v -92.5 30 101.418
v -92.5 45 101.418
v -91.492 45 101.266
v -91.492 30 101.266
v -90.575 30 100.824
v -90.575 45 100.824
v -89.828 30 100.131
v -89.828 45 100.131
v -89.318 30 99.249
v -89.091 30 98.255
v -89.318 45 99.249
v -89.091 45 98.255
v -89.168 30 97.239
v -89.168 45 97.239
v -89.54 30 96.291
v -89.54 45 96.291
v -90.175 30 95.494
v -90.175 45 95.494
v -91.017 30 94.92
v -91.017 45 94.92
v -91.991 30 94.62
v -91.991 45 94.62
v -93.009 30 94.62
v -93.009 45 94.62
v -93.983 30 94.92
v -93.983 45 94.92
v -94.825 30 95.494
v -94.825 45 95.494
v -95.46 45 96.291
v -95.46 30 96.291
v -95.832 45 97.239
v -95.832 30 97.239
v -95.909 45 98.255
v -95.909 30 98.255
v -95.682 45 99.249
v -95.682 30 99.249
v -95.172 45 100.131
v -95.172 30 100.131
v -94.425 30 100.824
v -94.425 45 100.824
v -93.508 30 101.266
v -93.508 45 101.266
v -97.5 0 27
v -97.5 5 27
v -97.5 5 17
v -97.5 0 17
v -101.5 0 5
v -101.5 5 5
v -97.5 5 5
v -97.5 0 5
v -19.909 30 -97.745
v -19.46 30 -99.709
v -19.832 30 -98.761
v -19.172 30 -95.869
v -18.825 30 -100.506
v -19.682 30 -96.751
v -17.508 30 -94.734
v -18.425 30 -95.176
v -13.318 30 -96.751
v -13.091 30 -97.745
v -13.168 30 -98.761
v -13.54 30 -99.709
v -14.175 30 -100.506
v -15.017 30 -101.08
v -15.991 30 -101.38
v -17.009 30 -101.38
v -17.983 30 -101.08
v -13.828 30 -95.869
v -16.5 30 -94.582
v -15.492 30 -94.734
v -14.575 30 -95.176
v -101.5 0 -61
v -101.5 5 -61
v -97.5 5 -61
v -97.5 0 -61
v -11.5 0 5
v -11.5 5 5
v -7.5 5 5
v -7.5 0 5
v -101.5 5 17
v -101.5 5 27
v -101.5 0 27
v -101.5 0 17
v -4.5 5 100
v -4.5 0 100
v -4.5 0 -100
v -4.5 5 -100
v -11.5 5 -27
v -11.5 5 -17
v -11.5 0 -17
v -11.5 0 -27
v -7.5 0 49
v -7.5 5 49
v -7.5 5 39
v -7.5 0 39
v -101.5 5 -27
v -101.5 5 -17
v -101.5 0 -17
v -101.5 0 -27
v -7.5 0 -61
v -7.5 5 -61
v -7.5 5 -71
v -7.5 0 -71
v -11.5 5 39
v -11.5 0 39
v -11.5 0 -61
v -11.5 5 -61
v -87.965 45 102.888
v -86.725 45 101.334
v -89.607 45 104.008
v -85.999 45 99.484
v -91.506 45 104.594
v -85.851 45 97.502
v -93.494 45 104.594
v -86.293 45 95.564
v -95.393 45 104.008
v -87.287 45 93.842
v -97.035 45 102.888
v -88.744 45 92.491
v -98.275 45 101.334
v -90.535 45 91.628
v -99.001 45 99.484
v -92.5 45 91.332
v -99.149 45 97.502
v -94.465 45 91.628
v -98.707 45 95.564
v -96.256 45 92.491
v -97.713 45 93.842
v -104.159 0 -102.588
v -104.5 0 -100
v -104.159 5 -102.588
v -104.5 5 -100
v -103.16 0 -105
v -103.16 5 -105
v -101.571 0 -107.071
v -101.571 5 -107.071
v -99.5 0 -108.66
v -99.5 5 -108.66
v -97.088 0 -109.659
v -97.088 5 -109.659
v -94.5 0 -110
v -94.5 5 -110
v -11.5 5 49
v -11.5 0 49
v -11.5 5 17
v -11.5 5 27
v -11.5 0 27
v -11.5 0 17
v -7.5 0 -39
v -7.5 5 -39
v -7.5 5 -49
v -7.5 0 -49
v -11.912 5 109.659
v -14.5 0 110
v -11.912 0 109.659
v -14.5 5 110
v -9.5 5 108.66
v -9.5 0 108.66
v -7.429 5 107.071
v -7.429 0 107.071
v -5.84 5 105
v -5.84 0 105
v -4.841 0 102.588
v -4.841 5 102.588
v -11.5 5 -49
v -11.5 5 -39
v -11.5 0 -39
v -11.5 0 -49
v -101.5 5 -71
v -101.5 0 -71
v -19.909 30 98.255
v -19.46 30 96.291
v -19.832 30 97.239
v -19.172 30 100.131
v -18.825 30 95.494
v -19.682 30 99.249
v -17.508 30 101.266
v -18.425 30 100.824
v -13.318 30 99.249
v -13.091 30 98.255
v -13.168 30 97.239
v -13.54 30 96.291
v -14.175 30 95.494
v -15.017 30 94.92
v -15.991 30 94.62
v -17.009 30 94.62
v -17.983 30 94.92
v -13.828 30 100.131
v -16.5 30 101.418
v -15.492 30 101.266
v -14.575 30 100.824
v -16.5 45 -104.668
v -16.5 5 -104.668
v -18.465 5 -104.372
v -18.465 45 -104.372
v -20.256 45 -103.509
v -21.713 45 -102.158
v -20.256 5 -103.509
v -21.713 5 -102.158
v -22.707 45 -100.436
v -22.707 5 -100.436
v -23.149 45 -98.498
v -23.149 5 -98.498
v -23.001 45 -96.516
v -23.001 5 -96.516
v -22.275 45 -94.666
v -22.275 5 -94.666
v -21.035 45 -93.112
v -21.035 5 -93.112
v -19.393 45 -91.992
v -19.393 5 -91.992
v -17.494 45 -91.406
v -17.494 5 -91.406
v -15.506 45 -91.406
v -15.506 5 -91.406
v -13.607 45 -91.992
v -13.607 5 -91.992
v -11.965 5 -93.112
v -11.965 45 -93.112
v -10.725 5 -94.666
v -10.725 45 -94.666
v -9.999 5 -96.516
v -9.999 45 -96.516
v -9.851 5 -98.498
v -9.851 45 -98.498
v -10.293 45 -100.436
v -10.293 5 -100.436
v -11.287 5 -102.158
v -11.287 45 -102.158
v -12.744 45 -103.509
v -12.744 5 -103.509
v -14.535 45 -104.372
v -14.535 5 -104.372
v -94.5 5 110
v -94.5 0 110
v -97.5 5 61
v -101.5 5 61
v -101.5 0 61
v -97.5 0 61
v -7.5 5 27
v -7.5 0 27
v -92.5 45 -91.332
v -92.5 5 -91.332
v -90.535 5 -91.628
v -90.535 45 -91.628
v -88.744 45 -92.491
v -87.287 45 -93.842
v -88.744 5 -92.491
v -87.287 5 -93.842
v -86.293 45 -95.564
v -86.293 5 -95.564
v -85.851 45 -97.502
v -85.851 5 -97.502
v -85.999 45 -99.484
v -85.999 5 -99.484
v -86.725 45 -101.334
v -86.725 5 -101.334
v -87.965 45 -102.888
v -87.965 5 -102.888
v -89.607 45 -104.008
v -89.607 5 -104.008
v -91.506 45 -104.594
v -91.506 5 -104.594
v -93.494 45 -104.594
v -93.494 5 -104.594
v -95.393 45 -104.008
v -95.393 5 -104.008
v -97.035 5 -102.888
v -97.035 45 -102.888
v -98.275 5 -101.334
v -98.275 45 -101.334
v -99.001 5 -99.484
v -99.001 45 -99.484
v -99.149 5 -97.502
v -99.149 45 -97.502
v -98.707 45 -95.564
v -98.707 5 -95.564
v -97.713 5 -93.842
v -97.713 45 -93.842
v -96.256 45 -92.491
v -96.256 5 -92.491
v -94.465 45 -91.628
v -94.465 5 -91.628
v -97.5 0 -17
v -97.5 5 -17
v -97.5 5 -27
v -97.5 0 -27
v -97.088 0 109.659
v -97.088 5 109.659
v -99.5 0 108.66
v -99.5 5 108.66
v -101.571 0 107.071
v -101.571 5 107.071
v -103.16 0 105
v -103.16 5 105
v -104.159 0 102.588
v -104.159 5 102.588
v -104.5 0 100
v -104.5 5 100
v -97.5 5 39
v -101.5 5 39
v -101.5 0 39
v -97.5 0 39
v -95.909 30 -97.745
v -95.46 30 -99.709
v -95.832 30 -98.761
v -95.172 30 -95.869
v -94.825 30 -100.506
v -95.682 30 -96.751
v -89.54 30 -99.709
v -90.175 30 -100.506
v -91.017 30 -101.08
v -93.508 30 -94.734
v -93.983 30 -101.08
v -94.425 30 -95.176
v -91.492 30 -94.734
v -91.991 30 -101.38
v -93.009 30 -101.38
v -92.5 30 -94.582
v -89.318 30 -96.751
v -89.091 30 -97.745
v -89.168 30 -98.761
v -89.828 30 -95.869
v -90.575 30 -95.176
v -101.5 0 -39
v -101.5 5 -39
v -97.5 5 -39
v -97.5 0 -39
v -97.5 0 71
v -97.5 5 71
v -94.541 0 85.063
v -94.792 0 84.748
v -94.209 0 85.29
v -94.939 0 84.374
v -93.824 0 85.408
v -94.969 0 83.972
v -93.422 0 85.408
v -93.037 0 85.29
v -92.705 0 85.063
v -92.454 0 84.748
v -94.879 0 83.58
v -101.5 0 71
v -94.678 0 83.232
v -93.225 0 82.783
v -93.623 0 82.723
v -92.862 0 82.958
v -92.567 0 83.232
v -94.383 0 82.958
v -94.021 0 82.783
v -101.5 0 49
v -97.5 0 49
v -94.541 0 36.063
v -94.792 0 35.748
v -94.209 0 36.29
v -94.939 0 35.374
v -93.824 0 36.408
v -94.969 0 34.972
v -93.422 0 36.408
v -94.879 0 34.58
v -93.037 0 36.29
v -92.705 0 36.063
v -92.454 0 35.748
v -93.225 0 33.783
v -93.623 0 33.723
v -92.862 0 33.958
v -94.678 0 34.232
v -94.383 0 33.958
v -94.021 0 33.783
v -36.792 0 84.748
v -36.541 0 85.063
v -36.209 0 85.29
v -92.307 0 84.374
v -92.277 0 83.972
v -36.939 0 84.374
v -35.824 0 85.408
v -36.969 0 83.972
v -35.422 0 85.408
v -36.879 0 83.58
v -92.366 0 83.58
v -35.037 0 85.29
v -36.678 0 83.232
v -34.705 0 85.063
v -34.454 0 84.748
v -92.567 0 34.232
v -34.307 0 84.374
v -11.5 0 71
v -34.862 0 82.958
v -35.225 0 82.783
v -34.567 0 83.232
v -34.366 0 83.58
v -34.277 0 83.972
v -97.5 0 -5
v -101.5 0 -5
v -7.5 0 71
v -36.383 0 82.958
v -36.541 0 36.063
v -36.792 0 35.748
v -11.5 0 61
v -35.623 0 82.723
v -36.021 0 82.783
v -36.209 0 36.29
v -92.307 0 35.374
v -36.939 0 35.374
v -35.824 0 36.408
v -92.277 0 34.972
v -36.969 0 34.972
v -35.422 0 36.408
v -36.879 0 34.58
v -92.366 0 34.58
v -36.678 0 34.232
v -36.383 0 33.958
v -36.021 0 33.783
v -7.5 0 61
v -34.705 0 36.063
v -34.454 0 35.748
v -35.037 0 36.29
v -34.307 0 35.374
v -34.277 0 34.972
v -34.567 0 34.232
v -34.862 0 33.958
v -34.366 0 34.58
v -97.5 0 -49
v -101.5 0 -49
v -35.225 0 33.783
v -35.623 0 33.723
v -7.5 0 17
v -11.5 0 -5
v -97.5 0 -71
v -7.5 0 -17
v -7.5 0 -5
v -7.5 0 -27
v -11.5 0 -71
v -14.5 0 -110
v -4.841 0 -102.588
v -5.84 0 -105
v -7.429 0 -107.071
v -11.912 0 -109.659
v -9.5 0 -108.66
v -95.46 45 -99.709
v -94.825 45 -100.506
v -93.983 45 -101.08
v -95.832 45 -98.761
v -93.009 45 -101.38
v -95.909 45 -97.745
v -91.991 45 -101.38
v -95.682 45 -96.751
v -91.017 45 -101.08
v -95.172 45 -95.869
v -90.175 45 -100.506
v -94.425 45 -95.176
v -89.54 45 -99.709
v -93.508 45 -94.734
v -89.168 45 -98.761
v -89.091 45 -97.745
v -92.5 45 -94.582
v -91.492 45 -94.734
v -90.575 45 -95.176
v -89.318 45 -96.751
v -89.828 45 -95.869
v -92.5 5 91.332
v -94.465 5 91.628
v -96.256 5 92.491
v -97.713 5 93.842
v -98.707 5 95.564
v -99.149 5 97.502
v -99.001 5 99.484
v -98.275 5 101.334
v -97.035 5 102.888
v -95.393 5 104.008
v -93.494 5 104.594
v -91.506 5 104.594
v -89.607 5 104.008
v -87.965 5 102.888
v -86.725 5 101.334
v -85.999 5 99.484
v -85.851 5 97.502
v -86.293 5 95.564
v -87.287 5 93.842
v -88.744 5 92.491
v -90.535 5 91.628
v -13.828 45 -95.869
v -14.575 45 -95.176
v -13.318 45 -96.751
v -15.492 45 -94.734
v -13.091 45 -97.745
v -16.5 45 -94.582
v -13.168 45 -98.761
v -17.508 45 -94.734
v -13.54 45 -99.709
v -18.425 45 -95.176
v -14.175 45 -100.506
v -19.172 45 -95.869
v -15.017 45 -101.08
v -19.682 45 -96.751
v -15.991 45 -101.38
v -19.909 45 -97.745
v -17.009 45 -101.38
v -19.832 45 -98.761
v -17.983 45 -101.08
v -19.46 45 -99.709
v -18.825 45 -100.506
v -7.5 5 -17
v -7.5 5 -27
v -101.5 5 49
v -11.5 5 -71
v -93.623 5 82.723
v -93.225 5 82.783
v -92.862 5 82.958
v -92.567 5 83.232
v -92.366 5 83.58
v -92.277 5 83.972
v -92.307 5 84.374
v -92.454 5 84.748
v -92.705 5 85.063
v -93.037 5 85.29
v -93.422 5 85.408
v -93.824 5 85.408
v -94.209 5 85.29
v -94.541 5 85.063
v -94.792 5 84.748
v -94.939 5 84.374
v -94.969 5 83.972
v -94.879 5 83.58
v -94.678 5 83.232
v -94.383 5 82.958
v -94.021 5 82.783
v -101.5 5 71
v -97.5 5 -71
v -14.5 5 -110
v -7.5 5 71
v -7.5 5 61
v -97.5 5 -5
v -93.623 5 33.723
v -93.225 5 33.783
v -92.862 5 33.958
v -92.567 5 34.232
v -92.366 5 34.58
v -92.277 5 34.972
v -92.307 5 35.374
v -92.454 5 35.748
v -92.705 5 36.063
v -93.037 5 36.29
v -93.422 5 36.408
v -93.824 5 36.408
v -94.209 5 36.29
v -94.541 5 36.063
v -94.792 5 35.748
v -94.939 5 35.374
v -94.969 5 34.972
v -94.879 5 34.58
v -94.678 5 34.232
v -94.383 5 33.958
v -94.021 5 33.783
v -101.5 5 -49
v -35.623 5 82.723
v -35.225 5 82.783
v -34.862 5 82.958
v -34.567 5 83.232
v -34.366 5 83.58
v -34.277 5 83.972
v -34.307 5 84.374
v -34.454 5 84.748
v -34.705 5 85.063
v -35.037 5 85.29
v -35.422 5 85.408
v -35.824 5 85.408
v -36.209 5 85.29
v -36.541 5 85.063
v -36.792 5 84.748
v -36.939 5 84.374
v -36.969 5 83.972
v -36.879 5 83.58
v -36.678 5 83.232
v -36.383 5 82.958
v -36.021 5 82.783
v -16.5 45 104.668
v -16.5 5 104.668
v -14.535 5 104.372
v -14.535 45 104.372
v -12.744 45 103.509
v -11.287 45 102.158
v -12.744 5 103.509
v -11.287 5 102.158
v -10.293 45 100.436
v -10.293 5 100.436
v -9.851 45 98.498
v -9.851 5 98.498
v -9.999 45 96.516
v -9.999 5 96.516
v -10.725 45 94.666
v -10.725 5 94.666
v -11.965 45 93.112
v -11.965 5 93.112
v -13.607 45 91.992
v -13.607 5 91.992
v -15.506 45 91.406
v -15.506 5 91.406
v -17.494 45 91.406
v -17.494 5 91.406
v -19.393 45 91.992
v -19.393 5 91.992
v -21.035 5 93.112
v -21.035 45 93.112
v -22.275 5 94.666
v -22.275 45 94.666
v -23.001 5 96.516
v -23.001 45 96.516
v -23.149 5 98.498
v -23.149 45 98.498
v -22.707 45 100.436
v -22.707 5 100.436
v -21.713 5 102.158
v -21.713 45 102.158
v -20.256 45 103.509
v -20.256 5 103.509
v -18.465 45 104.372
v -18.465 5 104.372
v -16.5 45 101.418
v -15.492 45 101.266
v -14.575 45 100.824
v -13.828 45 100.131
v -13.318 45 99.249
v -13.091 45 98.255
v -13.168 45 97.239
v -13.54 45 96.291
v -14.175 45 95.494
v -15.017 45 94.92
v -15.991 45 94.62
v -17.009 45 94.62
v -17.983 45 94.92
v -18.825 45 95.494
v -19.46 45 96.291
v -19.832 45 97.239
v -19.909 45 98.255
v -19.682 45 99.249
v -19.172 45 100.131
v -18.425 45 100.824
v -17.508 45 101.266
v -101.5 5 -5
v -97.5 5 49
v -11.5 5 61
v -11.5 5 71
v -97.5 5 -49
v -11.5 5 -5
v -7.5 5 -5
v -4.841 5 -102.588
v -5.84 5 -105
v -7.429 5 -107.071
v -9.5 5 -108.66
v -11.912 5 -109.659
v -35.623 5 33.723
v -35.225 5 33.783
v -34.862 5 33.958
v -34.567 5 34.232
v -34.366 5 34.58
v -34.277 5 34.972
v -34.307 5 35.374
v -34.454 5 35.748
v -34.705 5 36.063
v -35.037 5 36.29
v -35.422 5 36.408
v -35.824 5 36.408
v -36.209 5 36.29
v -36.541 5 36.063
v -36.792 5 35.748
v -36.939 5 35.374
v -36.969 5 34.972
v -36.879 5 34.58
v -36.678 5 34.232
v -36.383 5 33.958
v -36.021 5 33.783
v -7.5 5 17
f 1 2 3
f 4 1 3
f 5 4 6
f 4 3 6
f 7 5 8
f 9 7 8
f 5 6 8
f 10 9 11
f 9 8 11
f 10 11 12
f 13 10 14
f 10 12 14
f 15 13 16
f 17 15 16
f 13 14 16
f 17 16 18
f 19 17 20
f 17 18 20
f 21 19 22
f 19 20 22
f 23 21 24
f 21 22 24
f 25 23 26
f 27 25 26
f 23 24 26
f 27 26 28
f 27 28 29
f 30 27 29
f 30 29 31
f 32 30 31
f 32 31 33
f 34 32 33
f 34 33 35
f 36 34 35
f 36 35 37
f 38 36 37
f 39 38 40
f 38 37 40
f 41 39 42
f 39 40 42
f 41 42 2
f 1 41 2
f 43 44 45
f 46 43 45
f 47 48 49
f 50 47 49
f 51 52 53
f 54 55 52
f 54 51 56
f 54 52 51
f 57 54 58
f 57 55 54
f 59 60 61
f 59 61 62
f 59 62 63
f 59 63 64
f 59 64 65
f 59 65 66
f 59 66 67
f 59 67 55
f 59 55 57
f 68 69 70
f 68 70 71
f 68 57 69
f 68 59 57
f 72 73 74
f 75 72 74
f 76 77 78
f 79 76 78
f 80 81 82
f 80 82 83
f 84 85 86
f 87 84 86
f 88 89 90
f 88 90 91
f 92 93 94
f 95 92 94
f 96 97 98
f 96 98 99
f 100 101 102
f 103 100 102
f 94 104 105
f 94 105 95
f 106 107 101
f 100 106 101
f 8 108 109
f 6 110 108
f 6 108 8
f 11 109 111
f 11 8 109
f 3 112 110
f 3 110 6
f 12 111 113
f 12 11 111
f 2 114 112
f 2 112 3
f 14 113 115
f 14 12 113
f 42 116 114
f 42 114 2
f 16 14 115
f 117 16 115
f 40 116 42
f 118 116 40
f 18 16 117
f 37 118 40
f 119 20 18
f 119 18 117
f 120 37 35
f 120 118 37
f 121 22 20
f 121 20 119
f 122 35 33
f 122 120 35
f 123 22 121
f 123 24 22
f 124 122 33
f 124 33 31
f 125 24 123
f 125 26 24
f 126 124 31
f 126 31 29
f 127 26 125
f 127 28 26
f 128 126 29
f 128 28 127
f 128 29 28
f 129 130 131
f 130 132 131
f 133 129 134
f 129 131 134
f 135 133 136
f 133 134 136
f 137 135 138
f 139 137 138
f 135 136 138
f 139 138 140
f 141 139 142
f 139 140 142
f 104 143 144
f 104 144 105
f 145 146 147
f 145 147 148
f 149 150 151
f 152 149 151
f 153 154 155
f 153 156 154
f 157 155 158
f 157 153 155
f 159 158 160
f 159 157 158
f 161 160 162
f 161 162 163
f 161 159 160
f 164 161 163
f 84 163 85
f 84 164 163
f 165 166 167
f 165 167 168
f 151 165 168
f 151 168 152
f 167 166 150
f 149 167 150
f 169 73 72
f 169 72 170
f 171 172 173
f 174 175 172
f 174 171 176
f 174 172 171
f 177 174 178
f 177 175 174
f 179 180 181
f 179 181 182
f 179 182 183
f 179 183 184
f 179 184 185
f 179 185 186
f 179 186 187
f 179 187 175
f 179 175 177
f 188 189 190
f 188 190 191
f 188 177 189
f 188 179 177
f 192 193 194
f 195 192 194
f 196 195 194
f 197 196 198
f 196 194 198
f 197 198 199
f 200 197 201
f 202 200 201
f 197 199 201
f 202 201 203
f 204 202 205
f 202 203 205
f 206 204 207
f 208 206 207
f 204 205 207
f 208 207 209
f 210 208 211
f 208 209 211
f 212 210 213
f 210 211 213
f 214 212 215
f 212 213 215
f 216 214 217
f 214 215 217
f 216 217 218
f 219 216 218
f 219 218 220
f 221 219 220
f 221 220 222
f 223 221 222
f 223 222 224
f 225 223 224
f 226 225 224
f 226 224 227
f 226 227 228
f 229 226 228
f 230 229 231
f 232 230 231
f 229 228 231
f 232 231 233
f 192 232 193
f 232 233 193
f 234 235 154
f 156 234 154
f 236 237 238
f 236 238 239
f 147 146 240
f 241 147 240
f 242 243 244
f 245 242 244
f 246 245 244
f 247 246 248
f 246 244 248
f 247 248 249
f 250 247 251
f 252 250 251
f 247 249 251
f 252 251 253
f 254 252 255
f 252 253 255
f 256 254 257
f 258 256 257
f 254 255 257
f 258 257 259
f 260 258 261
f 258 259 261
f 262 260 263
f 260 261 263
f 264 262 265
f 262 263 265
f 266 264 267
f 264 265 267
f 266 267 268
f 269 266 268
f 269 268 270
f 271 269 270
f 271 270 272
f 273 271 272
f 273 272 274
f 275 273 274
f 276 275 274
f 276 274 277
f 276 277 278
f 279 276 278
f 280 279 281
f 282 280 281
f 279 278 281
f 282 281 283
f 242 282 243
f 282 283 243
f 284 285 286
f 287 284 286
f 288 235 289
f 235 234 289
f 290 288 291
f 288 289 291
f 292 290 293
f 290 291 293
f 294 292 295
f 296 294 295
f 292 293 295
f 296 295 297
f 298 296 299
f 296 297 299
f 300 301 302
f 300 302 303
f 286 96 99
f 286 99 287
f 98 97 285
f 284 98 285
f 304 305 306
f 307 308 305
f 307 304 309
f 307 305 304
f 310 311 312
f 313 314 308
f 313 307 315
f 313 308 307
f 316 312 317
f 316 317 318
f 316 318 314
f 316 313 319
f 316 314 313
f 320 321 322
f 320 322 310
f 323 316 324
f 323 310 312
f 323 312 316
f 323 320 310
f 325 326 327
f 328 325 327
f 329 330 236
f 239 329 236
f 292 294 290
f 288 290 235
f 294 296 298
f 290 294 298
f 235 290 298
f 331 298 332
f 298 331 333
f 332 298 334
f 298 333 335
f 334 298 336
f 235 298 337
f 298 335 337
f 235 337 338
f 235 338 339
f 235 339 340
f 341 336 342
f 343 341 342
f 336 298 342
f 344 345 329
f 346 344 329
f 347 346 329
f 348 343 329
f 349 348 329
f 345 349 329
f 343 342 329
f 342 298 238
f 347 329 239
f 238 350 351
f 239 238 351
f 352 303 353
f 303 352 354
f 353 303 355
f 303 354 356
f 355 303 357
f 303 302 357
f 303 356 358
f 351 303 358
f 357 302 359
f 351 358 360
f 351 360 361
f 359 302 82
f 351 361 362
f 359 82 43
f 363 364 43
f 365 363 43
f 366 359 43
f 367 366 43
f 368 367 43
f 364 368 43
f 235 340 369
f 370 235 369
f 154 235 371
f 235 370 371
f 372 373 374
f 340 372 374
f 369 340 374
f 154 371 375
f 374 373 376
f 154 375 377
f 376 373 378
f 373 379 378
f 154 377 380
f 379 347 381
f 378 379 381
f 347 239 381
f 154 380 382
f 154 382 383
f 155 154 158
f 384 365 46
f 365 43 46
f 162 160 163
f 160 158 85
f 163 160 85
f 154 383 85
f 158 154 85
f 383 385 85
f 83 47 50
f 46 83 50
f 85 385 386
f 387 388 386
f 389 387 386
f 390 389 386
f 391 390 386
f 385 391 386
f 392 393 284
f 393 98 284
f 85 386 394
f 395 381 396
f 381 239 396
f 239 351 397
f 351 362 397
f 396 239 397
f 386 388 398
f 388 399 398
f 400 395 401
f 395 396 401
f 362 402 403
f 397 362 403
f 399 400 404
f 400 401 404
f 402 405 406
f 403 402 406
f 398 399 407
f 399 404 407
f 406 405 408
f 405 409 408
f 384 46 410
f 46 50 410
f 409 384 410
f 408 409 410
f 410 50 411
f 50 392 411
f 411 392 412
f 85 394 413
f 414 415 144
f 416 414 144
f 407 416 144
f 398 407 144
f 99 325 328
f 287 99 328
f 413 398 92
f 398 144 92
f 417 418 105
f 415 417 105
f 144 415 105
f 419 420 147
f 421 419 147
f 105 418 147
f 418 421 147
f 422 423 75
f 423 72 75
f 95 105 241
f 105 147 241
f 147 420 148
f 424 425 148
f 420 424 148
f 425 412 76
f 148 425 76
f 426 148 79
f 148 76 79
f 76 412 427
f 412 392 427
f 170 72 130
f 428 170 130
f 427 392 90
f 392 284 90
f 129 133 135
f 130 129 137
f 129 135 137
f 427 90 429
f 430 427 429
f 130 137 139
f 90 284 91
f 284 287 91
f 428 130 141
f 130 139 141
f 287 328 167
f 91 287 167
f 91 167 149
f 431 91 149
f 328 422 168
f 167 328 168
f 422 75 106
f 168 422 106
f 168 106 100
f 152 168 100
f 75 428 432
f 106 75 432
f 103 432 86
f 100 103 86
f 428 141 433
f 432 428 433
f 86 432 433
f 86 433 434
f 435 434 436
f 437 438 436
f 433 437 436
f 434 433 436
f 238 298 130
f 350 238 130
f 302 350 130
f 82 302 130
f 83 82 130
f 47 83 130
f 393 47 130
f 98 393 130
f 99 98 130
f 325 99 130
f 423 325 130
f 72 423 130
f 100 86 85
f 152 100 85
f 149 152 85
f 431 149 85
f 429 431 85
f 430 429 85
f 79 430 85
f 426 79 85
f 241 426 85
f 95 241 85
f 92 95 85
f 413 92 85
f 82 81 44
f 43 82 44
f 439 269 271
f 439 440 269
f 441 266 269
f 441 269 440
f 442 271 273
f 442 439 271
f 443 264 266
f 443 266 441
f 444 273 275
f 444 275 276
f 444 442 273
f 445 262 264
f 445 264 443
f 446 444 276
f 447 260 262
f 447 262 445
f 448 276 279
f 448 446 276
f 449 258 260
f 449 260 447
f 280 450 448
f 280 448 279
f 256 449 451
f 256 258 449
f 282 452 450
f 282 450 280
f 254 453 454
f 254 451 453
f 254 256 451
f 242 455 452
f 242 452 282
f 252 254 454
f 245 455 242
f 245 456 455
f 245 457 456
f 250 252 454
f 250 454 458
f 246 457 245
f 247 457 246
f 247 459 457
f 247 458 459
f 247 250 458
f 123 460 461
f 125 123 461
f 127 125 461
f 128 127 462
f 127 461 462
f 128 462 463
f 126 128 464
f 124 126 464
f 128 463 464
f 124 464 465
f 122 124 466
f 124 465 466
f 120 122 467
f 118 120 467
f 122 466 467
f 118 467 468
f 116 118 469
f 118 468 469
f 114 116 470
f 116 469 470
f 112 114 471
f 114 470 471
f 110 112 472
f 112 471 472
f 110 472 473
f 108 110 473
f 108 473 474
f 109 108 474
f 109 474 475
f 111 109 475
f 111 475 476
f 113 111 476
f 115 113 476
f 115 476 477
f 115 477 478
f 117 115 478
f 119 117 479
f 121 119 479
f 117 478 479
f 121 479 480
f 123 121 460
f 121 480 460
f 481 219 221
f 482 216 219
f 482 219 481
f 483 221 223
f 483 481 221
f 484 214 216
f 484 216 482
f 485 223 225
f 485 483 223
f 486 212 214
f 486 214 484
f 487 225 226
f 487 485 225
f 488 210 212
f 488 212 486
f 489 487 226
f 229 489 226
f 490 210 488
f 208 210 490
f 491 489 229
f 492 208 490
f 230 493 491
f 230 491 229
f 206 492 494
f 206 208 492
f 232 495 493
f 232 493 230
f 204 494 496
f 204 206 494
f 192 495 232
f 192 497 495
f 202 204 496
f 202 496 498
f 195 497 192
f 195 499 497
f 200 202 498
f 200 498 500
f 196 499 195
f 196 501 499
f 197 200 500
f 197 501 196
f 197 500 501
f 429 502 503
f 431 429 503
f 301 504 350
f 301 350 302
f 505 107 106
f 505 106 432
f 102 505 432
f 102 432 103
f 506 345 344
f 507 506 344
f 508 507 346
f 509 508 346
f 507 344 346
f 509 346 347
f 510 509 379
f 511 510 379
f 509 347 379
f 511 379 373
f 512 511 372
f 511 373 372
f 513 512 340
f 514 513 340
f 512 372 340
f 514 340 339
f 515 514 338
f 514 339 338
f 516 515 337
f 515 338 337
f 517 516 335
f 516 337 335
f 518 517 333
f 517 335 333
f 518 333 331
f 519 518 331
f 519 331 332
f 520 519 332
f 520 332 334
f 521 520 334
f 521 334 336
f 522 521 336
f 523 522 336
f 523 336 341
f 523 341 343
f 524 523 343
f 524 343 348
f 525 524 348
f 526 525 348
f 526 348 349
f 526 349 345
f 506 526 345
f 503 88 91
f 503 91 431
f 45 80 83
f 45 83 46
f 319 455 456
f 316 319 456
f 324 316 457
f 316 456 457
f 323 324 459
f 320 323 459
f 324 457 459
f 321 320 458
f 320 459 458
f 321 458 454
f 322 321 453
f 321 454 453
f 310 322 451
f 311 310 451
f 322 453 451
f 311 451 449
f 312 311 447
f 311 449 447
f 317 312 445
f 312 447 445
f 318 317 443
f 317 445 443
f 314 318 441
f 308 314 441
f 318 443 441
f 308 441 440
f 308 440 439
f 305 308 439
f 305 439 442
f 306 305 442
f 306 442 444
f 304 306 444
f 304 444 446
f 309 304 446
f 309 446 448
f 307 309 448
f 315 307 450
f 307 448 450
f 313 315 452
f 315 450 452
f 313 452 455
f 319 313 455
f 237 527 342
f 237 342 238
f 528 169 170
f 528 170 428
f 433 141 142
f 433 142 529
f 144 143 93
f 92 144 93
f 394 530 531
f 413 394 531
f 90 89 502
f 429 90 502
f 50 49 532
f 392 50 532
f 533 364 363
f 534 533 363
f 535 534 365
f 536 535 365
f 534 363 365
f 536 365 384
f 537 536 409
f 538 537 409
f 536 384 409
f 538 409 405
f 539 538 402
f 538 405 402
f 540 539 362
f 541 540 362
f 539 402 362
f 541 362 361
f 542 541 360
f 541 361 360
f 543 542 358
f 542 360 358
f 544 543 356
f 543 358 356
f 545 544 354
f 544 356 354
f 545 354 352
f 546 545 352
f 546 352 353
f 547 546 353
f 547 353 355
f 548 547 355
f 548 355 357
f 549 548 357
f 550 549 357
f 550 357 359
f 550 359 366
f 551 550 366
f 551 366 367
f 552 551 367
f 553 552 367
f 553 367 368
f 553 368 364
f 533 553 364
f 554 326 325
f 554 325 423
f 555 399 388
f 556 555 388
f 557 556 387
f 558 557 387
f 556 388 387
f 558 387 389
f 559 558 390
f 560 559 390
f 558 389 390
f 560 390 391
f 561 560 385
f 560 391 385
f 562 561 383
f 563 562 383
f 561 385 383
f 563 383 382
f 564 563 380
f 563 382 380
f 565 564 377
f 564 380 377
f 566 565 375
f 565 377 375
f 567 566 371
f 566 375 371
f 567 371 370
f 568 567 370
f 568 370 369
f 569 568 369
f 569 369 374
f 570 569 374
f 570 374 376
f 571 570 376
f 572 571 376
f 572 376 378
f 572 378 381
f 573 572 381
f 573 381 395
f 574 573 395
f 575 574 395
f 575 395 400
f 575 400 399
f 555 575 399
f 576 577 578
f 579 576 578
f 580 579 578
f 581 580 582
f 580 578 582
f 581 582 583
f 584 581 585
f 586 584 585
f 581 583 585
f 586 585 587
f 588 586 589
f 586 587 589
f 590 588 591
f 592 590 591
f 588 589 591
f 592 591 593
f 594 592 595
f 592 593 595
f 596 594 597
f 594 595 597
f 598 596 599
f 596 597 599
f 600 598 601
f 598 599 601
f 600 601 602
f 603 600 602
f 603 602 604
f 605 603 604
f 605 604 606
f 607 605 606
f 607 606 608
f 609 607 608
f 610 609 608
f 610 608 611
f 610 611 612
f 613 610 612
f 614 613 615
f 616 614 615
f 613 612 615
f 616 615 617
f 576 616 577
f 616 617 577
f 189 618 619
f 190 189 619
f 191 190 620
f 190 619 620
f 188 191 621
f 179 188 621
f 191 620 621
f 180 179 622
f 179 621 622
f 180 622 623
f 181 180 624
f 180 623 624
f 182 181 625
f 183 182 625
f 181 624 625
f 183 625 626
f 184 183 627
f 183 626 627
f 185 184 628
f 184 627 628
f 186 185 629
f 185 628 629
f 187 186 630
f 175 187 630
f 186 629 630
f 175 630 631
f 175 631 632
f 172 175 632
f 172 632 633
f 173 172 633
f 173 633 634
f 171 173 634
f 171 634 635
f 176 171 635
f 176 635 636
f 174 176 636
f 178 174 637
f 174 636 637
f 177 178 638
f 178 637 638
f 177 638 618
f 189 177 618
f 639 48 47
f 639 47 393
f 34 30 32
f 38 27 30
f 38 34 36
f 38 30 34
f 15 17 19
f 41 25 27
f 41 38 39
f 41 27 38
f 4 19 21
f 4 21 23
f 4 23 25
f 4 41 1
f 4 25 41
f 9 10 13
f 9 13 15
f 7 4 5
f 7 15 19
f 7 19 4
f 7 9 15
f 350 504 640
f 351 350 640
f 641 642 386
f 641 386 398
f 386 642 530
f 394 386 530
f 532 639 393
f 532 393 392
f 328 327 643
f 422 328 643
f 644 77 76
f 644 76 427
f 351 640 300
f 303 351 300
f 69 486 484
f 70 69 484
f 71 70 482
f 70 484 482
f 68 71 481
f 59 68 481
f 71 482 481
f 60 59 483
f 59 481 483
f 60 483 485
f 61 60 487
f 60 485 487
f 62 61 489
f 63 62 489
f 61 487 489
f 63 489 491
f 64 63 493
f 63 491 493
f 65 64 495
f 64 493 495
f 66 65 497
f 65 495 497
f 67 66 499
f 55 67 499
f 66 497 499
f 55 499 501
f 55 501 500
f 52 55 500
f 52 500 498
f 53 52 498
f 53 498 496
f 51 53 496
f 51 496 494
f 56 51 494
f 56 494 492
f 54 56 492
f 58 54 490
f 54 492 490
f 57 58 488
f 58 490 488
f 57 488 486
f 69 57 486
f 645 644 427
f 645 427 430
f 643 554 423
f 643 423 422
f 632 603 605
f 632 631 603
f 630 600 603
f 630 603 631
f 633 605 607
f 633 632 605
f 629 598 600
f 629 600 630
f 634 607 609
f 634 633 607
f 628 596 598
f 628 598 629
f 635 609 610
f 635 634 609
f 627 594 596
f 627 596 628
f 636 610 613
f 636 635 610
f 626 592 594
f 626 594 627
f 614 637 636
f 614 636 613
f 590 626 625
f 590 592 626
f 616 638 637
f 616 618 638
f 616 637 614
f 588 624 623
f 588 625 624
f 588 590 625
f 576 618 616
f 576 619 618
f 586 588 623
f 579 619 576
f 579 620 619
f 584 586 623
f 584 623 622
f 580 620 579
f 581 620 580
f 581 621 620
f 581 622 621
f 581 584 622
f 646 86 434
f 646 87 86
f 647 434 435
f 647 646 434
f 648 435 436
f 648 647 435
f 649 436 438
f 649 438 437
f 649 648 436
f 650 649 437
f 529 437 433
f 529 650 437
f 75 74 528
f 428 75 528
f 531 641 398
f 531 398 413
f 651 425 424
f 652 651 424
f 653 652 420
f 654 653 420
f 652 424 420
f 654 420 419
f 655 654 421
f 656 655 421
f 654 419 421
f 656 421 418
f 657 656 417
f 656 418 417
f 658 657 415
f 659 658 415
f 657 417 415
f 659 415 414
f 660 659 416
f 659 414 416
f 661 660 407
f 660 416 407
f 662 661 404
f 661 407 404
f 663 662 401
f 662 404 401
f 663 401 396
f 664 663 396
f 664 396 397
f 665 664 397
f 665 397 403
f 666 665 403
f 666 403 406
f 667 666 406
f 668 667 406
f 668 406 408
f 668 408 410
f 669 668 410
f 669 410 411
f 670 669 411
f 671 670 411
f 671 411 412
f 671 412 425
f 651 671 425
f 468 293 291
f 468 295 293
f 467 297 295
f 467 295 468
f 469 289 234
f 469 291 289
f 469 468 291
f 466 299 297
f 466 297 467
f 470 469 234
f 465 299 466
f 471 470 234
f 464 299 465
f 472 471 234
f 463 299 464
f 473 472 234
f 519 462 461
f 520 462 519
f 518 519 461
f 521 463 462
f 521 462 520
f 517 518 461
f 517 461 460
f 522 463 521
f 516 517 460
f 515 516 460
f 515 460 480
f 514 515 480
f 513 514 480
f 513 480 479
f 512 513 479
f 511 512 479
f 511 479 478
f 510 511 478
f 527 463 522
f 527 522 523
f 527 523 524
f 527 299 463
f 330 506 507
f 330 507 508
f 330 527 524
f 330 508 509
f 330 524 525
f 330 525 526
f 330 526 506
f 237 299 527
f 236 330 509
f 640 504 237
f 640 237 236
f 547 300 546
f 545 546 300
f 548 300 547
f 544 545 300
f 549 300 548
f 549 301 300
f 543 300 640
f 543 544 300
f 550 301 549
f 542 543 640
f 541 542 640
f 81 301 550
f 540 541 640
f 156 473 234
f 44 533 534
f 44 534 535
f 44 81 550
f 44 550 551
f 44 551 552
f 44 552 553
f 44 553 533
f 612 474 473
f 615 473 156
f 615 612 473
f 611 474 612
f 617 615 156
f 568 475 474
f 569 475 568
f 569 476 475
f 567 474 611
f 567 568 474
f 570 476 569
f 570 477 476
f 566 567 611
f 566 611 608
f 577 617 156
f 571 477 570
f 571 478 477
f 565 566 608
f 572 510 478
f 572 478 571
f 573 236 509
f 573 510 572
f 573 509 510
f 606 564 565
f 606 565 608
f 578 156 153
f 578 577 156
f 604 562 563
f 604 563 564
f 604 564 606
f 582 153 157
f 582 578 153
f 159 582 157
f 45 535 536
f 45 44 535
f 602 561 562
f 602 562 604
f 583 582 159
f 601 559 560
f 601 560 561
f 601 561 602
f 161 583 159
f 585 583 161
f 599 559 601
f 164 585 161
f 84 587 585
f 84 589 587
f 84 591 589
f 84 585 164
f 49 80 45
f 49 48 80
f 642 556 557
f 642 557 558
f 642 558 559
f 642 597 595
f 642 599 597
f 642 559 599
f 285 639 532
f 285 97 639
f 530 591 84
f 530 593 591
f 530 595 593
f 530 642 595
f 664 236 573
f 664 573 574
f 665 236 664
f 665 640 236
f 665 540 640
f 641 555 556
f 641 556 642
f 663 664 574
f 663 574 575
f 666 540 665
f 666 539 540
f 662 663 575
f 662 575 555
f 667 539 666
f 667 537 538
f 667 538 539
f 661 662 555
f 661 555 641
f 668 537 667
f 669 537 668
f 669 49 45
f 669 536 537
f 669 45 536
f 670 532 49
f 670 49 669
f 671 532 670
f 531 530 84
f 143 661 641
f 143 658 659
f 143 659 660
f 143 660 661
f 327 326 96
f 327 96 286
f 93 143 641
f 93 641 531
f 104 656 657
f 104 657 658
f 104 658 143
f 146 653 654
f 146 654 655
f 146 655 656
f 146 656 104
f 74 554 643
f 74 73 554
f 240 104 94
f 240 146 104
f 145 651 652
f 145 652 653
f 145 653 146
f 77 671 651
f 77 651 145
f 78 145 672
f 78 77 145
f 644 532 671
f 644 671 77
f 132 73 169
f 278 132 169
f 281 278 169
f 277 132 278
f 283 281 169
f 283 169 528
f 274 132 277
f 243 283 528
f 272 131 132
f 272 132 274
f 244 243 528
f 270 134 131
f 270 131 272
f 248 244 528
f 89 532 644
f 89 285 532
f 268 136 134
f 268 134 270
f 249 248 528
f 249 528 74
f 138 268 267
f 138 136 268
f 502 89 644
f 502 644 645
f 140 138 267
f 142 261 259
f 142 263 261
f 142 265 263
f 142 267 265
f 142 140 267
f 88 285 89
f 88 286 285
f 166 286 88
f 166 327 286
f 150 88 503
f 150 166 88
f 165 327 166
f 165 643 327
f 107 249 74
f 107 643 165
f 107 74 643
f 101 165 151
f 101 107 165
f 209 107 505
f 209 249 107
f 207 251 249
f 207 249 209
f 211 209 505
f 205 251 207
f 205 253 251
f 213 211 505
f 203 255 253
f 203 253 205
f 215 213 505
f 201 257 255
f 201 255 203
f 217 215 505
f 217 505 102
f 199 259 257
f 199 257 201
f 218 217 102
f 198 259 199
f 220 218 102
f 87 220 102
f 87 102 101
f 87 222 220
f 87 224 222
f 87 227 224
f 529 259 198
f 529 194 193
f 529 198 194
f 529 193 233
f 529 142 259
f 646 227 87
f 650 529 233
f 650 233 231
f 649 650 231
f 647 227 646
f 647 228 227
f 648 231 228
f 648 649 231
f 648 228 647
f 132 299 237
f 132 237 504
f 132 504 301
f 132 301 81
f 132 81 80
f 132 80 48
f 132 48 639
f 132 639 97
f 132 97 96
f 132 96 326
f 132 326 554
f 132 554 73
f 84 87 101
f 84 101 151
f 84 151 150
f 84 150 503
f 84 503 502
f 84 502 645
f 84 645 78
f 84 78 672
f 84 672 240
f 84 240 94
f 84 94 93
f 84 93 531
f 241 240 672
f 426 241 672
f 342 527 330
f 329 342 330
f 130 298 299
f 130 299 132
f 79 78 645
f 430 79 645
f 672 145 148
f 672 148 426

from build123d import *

# Parameters (mm, degrees)
SKETCH1_W           = 100
SKETCH1_H           = 220
BOSS_EXTRUDE1_DEPTH = 5
FILLET1_R           = 10
FILLET2_R           = 10
FILLET3_R           = 10
FILLET4_R           = 10
SKETCH2_R           = 6.668119003
BOSS_EXTRUDE2_DEPTH = 40
SKETCH4_R           = 3.418119003
CUT_EXTRUDE1_DEPTH  = 15
SKETCH5_R           = 3.418119003
CUT_EXTRUDE2_DEPTH  = 15
SKETCH6_R           = 3.418119003
CUT_EXTRUDE3_DEPTH  = 15
SKETCH7_R           = 3.418119003
CUT_EXTRUDE4_DEPTH  = 15
SKETCH8_W           = 4
SKETCH8_H           = 10
CUT_EXTRUDE5_DEPTH  = 157.908412776
SKETCH9_R           = 1.35
CUT_EXTRUDE7_DEPTH  = 159.256911381


with BuildPart() as part:
    # Sketch1 → Boss-Extrude1 (new body)
    with BuildSketch(Plane(origin=(0, 0, 0), x_dir=(1, 0, 0), z_dir=(0, 1, 0))):
        with Locations((-54.5, 0)):
            Rectangle(SKETCH1_W, SKETCH1_H)
    extrude(amount=BOSS_EXTRUDE1_DEPTH)

    # Fillet1
    fillet1_edges = [part.edges().sort_by_distance(p)[0] for p in [
        (-4.5, 2.5, 110),
    ]]
    fillet(fillet1_edges, radius=FILLET1_R)

    # Fillet2
    fillet2_edges = [part.edges().sort_by_distance(p)[0] for p in [
        (-4.5, 2.5, -110),
    ]]
    fillet(fillet2_edges, radius=FILLET2_R)

    # Fillet3
    fillet3_edges = [part.edges().sort_by_distance(p)[0] for p in [
        (-104.5, 2.5, 110),
    ]]
    fillet(fillet3_edges, radius=FILLET3_R)

    # Fillet4
    fillet4_edges = [part.edges().sort_by_distance(p)[0] for p in [
        (-104.5, 2.5, -110),
    ]]
    fillet(fillet4_edges, radius=FILLET4_R)

    # Sketch2 → Boss-Extrude2 (add)
    with BuildSketch(Plane(origin=(0, 5, 0), x_dir=(1, 0, 0), z_dir=(0, 1, 0))):
        with Locations(Location((-92.5, 98, 0), (0, 0, 270))):
            Circle(SKETCH2_R)
        with Locations(Location((-92.5, -98, 0), (0, 0, 90))):
            Circle(SKETCH2_R)
        with Locations(Location((-16.5, 98, 0), (0, 0, 90))):
            Circle(SKETCH2_R)
        with Locations(Location((-16.5, -98, 0), (0, 0, 270))):
            Circle(SKETCH2_R)
    extrude(amount=BOSS_EXTRUDE2_DEPTH)

    # Sketch4 → Cut-Extrude1 (cut)
    with BuildSketch(Plane(origin=(0, 45, 0), x_dir=(1, 0, 0), z_dir=(0, 1, 0))):
        with Locations(Location((-92.5, 98, 0), (0, 0, 270))):
            Circle(SKETCH4_R)
    extrude(amount=-CUT_EXTRUDE1_DEPTH, mode=Mode.SUBTRACT)

    # Sketch5 → Cut-Extrude2 (cut)
    with BuildSketch(Plane(origin=(0, 45, 0), x_dir=(1, 0, 0), z_dir=(0, 1, 0))):
        with Locations(Location((-92.5, -98, 0), (0, 0, 270))):
            Circle(SKETCH5_R)
    extrude(amount=-CUT_EXTRUDE2_DEPTH, mode=Mode.SUBTRACT)

    # Sketch6 → Cut-Extrude3 (cut)
    with BuildSketch(Plane(origin=(0, 45, 0), x_dir=(1, 0, 0), z_dir=(0, 1, 0))):
        with Locations(Location((-16.5, 98, 0), (0, 0, 270))):
            Circle(SKETCH6_R)
    extrude(amount=-CUT_EXTRUDE3_DEPTH, mode=Mode.SUBTRACT)

    # Sketch7 → Cut-Extrude4 (cut)
    with BuildSketch(Plane(origin=(0, 45, 0), x_dir=(1, 0, 0), z_dir=(0, 1, 0))):
        with Locations(Location((-16.5, -98, 0), (0, 0, 270))):
            Circle(SKETCH7_R)
    extrude(amount=-CUT_EXTRUDE4_DEPTH, mode=Mode.SUBTRACT)

    # Sketch8 → Cut-Extrude5 (cut, through all)
    with BuildSketch(Plane(origin=(0, 5, 0), x_dir=(1, 0, 0), z_dir=(0, 1, 0))):
        with Locations((-99.5, 66)):
            Rectangle(SKETCH8_W, SKETCH8_H)
        with Locations((-99.5, 44)):
            Rectangle(SKETCH8_W, SKETCH8_H)
        with Locations((-99.5, 22)):
            Rectangle(SKETCH8_W, SKETCH8_H)
        with Locations((-99.5, 0)):
            Rectangle(SKETCH8_W, SKETCH8_H)
        with Locations((-9.5, -66)):
            Rectangle(SKETCH8_W, SKETCH8_H)
        with Locations((-9.5, -44)):
            Rectangle(SKETCH8_W, SKETCH8_H)
        with Locations((-99.5, -22)):
            Rectangle(SKETCH8_W, SKETCH8_H)
        with Locations((-99.5, -44)):
            Rectangle(SKETCH8_W, SKETCH8_H)
        with Locations((-99.5, -66)):
            Rectangle(SKETCH8_W, SKETCH8_H)
        with Locations((-9.5, -22)):
            Rectangle(SKETCH8_W, SKETCH8_H)
        with Locations((-9.5, 0)):
            Rectangle(SKETCH8_W, SKETCH8_H)
        with Locations((-9.5, 22)):
            Rectangle(SKETCH8_W, SKETCH8_H)
        with Locations((-9.5, 44)):
            Rectangle(SKETCH8_W, SKETCH8_H)
        with Locations((-9.5, 66)):
            Rectangle(SKETCH8_W, SKETCH8_H)
    extrude(amount=-CUT_EXTRUDE5_DEPTH, mode=Mode.SUBTRACT)

    # Sketch9 → Cut-Extrude7 (cut, through all)
    with BuildSketch(Plane.XZ):
        with Locations(Location((-93.622758359, 35.073260268, 0), (0, 0, 270))):
            Circle(SKETCH9_R)
        with Locations(Location((-35.622758359, 35.073260268, 0), (0, 0, 270))):
            Circle(SKETCH9_R)
        with Locations(Location((-35.622758359, 84.073260268, 0), (0, 0, 270))):
            Circle(SKETCH9_R)
        with Locations(Location((-93.622758359, 84.073260268, 0), (0, 0, 270))):
            Circle(SKETCH9_R)
    extrude(amount=-CUT_EXTRUDE7_DEPTH, mode=Mode.SUBTRACT)


solid = part.part
